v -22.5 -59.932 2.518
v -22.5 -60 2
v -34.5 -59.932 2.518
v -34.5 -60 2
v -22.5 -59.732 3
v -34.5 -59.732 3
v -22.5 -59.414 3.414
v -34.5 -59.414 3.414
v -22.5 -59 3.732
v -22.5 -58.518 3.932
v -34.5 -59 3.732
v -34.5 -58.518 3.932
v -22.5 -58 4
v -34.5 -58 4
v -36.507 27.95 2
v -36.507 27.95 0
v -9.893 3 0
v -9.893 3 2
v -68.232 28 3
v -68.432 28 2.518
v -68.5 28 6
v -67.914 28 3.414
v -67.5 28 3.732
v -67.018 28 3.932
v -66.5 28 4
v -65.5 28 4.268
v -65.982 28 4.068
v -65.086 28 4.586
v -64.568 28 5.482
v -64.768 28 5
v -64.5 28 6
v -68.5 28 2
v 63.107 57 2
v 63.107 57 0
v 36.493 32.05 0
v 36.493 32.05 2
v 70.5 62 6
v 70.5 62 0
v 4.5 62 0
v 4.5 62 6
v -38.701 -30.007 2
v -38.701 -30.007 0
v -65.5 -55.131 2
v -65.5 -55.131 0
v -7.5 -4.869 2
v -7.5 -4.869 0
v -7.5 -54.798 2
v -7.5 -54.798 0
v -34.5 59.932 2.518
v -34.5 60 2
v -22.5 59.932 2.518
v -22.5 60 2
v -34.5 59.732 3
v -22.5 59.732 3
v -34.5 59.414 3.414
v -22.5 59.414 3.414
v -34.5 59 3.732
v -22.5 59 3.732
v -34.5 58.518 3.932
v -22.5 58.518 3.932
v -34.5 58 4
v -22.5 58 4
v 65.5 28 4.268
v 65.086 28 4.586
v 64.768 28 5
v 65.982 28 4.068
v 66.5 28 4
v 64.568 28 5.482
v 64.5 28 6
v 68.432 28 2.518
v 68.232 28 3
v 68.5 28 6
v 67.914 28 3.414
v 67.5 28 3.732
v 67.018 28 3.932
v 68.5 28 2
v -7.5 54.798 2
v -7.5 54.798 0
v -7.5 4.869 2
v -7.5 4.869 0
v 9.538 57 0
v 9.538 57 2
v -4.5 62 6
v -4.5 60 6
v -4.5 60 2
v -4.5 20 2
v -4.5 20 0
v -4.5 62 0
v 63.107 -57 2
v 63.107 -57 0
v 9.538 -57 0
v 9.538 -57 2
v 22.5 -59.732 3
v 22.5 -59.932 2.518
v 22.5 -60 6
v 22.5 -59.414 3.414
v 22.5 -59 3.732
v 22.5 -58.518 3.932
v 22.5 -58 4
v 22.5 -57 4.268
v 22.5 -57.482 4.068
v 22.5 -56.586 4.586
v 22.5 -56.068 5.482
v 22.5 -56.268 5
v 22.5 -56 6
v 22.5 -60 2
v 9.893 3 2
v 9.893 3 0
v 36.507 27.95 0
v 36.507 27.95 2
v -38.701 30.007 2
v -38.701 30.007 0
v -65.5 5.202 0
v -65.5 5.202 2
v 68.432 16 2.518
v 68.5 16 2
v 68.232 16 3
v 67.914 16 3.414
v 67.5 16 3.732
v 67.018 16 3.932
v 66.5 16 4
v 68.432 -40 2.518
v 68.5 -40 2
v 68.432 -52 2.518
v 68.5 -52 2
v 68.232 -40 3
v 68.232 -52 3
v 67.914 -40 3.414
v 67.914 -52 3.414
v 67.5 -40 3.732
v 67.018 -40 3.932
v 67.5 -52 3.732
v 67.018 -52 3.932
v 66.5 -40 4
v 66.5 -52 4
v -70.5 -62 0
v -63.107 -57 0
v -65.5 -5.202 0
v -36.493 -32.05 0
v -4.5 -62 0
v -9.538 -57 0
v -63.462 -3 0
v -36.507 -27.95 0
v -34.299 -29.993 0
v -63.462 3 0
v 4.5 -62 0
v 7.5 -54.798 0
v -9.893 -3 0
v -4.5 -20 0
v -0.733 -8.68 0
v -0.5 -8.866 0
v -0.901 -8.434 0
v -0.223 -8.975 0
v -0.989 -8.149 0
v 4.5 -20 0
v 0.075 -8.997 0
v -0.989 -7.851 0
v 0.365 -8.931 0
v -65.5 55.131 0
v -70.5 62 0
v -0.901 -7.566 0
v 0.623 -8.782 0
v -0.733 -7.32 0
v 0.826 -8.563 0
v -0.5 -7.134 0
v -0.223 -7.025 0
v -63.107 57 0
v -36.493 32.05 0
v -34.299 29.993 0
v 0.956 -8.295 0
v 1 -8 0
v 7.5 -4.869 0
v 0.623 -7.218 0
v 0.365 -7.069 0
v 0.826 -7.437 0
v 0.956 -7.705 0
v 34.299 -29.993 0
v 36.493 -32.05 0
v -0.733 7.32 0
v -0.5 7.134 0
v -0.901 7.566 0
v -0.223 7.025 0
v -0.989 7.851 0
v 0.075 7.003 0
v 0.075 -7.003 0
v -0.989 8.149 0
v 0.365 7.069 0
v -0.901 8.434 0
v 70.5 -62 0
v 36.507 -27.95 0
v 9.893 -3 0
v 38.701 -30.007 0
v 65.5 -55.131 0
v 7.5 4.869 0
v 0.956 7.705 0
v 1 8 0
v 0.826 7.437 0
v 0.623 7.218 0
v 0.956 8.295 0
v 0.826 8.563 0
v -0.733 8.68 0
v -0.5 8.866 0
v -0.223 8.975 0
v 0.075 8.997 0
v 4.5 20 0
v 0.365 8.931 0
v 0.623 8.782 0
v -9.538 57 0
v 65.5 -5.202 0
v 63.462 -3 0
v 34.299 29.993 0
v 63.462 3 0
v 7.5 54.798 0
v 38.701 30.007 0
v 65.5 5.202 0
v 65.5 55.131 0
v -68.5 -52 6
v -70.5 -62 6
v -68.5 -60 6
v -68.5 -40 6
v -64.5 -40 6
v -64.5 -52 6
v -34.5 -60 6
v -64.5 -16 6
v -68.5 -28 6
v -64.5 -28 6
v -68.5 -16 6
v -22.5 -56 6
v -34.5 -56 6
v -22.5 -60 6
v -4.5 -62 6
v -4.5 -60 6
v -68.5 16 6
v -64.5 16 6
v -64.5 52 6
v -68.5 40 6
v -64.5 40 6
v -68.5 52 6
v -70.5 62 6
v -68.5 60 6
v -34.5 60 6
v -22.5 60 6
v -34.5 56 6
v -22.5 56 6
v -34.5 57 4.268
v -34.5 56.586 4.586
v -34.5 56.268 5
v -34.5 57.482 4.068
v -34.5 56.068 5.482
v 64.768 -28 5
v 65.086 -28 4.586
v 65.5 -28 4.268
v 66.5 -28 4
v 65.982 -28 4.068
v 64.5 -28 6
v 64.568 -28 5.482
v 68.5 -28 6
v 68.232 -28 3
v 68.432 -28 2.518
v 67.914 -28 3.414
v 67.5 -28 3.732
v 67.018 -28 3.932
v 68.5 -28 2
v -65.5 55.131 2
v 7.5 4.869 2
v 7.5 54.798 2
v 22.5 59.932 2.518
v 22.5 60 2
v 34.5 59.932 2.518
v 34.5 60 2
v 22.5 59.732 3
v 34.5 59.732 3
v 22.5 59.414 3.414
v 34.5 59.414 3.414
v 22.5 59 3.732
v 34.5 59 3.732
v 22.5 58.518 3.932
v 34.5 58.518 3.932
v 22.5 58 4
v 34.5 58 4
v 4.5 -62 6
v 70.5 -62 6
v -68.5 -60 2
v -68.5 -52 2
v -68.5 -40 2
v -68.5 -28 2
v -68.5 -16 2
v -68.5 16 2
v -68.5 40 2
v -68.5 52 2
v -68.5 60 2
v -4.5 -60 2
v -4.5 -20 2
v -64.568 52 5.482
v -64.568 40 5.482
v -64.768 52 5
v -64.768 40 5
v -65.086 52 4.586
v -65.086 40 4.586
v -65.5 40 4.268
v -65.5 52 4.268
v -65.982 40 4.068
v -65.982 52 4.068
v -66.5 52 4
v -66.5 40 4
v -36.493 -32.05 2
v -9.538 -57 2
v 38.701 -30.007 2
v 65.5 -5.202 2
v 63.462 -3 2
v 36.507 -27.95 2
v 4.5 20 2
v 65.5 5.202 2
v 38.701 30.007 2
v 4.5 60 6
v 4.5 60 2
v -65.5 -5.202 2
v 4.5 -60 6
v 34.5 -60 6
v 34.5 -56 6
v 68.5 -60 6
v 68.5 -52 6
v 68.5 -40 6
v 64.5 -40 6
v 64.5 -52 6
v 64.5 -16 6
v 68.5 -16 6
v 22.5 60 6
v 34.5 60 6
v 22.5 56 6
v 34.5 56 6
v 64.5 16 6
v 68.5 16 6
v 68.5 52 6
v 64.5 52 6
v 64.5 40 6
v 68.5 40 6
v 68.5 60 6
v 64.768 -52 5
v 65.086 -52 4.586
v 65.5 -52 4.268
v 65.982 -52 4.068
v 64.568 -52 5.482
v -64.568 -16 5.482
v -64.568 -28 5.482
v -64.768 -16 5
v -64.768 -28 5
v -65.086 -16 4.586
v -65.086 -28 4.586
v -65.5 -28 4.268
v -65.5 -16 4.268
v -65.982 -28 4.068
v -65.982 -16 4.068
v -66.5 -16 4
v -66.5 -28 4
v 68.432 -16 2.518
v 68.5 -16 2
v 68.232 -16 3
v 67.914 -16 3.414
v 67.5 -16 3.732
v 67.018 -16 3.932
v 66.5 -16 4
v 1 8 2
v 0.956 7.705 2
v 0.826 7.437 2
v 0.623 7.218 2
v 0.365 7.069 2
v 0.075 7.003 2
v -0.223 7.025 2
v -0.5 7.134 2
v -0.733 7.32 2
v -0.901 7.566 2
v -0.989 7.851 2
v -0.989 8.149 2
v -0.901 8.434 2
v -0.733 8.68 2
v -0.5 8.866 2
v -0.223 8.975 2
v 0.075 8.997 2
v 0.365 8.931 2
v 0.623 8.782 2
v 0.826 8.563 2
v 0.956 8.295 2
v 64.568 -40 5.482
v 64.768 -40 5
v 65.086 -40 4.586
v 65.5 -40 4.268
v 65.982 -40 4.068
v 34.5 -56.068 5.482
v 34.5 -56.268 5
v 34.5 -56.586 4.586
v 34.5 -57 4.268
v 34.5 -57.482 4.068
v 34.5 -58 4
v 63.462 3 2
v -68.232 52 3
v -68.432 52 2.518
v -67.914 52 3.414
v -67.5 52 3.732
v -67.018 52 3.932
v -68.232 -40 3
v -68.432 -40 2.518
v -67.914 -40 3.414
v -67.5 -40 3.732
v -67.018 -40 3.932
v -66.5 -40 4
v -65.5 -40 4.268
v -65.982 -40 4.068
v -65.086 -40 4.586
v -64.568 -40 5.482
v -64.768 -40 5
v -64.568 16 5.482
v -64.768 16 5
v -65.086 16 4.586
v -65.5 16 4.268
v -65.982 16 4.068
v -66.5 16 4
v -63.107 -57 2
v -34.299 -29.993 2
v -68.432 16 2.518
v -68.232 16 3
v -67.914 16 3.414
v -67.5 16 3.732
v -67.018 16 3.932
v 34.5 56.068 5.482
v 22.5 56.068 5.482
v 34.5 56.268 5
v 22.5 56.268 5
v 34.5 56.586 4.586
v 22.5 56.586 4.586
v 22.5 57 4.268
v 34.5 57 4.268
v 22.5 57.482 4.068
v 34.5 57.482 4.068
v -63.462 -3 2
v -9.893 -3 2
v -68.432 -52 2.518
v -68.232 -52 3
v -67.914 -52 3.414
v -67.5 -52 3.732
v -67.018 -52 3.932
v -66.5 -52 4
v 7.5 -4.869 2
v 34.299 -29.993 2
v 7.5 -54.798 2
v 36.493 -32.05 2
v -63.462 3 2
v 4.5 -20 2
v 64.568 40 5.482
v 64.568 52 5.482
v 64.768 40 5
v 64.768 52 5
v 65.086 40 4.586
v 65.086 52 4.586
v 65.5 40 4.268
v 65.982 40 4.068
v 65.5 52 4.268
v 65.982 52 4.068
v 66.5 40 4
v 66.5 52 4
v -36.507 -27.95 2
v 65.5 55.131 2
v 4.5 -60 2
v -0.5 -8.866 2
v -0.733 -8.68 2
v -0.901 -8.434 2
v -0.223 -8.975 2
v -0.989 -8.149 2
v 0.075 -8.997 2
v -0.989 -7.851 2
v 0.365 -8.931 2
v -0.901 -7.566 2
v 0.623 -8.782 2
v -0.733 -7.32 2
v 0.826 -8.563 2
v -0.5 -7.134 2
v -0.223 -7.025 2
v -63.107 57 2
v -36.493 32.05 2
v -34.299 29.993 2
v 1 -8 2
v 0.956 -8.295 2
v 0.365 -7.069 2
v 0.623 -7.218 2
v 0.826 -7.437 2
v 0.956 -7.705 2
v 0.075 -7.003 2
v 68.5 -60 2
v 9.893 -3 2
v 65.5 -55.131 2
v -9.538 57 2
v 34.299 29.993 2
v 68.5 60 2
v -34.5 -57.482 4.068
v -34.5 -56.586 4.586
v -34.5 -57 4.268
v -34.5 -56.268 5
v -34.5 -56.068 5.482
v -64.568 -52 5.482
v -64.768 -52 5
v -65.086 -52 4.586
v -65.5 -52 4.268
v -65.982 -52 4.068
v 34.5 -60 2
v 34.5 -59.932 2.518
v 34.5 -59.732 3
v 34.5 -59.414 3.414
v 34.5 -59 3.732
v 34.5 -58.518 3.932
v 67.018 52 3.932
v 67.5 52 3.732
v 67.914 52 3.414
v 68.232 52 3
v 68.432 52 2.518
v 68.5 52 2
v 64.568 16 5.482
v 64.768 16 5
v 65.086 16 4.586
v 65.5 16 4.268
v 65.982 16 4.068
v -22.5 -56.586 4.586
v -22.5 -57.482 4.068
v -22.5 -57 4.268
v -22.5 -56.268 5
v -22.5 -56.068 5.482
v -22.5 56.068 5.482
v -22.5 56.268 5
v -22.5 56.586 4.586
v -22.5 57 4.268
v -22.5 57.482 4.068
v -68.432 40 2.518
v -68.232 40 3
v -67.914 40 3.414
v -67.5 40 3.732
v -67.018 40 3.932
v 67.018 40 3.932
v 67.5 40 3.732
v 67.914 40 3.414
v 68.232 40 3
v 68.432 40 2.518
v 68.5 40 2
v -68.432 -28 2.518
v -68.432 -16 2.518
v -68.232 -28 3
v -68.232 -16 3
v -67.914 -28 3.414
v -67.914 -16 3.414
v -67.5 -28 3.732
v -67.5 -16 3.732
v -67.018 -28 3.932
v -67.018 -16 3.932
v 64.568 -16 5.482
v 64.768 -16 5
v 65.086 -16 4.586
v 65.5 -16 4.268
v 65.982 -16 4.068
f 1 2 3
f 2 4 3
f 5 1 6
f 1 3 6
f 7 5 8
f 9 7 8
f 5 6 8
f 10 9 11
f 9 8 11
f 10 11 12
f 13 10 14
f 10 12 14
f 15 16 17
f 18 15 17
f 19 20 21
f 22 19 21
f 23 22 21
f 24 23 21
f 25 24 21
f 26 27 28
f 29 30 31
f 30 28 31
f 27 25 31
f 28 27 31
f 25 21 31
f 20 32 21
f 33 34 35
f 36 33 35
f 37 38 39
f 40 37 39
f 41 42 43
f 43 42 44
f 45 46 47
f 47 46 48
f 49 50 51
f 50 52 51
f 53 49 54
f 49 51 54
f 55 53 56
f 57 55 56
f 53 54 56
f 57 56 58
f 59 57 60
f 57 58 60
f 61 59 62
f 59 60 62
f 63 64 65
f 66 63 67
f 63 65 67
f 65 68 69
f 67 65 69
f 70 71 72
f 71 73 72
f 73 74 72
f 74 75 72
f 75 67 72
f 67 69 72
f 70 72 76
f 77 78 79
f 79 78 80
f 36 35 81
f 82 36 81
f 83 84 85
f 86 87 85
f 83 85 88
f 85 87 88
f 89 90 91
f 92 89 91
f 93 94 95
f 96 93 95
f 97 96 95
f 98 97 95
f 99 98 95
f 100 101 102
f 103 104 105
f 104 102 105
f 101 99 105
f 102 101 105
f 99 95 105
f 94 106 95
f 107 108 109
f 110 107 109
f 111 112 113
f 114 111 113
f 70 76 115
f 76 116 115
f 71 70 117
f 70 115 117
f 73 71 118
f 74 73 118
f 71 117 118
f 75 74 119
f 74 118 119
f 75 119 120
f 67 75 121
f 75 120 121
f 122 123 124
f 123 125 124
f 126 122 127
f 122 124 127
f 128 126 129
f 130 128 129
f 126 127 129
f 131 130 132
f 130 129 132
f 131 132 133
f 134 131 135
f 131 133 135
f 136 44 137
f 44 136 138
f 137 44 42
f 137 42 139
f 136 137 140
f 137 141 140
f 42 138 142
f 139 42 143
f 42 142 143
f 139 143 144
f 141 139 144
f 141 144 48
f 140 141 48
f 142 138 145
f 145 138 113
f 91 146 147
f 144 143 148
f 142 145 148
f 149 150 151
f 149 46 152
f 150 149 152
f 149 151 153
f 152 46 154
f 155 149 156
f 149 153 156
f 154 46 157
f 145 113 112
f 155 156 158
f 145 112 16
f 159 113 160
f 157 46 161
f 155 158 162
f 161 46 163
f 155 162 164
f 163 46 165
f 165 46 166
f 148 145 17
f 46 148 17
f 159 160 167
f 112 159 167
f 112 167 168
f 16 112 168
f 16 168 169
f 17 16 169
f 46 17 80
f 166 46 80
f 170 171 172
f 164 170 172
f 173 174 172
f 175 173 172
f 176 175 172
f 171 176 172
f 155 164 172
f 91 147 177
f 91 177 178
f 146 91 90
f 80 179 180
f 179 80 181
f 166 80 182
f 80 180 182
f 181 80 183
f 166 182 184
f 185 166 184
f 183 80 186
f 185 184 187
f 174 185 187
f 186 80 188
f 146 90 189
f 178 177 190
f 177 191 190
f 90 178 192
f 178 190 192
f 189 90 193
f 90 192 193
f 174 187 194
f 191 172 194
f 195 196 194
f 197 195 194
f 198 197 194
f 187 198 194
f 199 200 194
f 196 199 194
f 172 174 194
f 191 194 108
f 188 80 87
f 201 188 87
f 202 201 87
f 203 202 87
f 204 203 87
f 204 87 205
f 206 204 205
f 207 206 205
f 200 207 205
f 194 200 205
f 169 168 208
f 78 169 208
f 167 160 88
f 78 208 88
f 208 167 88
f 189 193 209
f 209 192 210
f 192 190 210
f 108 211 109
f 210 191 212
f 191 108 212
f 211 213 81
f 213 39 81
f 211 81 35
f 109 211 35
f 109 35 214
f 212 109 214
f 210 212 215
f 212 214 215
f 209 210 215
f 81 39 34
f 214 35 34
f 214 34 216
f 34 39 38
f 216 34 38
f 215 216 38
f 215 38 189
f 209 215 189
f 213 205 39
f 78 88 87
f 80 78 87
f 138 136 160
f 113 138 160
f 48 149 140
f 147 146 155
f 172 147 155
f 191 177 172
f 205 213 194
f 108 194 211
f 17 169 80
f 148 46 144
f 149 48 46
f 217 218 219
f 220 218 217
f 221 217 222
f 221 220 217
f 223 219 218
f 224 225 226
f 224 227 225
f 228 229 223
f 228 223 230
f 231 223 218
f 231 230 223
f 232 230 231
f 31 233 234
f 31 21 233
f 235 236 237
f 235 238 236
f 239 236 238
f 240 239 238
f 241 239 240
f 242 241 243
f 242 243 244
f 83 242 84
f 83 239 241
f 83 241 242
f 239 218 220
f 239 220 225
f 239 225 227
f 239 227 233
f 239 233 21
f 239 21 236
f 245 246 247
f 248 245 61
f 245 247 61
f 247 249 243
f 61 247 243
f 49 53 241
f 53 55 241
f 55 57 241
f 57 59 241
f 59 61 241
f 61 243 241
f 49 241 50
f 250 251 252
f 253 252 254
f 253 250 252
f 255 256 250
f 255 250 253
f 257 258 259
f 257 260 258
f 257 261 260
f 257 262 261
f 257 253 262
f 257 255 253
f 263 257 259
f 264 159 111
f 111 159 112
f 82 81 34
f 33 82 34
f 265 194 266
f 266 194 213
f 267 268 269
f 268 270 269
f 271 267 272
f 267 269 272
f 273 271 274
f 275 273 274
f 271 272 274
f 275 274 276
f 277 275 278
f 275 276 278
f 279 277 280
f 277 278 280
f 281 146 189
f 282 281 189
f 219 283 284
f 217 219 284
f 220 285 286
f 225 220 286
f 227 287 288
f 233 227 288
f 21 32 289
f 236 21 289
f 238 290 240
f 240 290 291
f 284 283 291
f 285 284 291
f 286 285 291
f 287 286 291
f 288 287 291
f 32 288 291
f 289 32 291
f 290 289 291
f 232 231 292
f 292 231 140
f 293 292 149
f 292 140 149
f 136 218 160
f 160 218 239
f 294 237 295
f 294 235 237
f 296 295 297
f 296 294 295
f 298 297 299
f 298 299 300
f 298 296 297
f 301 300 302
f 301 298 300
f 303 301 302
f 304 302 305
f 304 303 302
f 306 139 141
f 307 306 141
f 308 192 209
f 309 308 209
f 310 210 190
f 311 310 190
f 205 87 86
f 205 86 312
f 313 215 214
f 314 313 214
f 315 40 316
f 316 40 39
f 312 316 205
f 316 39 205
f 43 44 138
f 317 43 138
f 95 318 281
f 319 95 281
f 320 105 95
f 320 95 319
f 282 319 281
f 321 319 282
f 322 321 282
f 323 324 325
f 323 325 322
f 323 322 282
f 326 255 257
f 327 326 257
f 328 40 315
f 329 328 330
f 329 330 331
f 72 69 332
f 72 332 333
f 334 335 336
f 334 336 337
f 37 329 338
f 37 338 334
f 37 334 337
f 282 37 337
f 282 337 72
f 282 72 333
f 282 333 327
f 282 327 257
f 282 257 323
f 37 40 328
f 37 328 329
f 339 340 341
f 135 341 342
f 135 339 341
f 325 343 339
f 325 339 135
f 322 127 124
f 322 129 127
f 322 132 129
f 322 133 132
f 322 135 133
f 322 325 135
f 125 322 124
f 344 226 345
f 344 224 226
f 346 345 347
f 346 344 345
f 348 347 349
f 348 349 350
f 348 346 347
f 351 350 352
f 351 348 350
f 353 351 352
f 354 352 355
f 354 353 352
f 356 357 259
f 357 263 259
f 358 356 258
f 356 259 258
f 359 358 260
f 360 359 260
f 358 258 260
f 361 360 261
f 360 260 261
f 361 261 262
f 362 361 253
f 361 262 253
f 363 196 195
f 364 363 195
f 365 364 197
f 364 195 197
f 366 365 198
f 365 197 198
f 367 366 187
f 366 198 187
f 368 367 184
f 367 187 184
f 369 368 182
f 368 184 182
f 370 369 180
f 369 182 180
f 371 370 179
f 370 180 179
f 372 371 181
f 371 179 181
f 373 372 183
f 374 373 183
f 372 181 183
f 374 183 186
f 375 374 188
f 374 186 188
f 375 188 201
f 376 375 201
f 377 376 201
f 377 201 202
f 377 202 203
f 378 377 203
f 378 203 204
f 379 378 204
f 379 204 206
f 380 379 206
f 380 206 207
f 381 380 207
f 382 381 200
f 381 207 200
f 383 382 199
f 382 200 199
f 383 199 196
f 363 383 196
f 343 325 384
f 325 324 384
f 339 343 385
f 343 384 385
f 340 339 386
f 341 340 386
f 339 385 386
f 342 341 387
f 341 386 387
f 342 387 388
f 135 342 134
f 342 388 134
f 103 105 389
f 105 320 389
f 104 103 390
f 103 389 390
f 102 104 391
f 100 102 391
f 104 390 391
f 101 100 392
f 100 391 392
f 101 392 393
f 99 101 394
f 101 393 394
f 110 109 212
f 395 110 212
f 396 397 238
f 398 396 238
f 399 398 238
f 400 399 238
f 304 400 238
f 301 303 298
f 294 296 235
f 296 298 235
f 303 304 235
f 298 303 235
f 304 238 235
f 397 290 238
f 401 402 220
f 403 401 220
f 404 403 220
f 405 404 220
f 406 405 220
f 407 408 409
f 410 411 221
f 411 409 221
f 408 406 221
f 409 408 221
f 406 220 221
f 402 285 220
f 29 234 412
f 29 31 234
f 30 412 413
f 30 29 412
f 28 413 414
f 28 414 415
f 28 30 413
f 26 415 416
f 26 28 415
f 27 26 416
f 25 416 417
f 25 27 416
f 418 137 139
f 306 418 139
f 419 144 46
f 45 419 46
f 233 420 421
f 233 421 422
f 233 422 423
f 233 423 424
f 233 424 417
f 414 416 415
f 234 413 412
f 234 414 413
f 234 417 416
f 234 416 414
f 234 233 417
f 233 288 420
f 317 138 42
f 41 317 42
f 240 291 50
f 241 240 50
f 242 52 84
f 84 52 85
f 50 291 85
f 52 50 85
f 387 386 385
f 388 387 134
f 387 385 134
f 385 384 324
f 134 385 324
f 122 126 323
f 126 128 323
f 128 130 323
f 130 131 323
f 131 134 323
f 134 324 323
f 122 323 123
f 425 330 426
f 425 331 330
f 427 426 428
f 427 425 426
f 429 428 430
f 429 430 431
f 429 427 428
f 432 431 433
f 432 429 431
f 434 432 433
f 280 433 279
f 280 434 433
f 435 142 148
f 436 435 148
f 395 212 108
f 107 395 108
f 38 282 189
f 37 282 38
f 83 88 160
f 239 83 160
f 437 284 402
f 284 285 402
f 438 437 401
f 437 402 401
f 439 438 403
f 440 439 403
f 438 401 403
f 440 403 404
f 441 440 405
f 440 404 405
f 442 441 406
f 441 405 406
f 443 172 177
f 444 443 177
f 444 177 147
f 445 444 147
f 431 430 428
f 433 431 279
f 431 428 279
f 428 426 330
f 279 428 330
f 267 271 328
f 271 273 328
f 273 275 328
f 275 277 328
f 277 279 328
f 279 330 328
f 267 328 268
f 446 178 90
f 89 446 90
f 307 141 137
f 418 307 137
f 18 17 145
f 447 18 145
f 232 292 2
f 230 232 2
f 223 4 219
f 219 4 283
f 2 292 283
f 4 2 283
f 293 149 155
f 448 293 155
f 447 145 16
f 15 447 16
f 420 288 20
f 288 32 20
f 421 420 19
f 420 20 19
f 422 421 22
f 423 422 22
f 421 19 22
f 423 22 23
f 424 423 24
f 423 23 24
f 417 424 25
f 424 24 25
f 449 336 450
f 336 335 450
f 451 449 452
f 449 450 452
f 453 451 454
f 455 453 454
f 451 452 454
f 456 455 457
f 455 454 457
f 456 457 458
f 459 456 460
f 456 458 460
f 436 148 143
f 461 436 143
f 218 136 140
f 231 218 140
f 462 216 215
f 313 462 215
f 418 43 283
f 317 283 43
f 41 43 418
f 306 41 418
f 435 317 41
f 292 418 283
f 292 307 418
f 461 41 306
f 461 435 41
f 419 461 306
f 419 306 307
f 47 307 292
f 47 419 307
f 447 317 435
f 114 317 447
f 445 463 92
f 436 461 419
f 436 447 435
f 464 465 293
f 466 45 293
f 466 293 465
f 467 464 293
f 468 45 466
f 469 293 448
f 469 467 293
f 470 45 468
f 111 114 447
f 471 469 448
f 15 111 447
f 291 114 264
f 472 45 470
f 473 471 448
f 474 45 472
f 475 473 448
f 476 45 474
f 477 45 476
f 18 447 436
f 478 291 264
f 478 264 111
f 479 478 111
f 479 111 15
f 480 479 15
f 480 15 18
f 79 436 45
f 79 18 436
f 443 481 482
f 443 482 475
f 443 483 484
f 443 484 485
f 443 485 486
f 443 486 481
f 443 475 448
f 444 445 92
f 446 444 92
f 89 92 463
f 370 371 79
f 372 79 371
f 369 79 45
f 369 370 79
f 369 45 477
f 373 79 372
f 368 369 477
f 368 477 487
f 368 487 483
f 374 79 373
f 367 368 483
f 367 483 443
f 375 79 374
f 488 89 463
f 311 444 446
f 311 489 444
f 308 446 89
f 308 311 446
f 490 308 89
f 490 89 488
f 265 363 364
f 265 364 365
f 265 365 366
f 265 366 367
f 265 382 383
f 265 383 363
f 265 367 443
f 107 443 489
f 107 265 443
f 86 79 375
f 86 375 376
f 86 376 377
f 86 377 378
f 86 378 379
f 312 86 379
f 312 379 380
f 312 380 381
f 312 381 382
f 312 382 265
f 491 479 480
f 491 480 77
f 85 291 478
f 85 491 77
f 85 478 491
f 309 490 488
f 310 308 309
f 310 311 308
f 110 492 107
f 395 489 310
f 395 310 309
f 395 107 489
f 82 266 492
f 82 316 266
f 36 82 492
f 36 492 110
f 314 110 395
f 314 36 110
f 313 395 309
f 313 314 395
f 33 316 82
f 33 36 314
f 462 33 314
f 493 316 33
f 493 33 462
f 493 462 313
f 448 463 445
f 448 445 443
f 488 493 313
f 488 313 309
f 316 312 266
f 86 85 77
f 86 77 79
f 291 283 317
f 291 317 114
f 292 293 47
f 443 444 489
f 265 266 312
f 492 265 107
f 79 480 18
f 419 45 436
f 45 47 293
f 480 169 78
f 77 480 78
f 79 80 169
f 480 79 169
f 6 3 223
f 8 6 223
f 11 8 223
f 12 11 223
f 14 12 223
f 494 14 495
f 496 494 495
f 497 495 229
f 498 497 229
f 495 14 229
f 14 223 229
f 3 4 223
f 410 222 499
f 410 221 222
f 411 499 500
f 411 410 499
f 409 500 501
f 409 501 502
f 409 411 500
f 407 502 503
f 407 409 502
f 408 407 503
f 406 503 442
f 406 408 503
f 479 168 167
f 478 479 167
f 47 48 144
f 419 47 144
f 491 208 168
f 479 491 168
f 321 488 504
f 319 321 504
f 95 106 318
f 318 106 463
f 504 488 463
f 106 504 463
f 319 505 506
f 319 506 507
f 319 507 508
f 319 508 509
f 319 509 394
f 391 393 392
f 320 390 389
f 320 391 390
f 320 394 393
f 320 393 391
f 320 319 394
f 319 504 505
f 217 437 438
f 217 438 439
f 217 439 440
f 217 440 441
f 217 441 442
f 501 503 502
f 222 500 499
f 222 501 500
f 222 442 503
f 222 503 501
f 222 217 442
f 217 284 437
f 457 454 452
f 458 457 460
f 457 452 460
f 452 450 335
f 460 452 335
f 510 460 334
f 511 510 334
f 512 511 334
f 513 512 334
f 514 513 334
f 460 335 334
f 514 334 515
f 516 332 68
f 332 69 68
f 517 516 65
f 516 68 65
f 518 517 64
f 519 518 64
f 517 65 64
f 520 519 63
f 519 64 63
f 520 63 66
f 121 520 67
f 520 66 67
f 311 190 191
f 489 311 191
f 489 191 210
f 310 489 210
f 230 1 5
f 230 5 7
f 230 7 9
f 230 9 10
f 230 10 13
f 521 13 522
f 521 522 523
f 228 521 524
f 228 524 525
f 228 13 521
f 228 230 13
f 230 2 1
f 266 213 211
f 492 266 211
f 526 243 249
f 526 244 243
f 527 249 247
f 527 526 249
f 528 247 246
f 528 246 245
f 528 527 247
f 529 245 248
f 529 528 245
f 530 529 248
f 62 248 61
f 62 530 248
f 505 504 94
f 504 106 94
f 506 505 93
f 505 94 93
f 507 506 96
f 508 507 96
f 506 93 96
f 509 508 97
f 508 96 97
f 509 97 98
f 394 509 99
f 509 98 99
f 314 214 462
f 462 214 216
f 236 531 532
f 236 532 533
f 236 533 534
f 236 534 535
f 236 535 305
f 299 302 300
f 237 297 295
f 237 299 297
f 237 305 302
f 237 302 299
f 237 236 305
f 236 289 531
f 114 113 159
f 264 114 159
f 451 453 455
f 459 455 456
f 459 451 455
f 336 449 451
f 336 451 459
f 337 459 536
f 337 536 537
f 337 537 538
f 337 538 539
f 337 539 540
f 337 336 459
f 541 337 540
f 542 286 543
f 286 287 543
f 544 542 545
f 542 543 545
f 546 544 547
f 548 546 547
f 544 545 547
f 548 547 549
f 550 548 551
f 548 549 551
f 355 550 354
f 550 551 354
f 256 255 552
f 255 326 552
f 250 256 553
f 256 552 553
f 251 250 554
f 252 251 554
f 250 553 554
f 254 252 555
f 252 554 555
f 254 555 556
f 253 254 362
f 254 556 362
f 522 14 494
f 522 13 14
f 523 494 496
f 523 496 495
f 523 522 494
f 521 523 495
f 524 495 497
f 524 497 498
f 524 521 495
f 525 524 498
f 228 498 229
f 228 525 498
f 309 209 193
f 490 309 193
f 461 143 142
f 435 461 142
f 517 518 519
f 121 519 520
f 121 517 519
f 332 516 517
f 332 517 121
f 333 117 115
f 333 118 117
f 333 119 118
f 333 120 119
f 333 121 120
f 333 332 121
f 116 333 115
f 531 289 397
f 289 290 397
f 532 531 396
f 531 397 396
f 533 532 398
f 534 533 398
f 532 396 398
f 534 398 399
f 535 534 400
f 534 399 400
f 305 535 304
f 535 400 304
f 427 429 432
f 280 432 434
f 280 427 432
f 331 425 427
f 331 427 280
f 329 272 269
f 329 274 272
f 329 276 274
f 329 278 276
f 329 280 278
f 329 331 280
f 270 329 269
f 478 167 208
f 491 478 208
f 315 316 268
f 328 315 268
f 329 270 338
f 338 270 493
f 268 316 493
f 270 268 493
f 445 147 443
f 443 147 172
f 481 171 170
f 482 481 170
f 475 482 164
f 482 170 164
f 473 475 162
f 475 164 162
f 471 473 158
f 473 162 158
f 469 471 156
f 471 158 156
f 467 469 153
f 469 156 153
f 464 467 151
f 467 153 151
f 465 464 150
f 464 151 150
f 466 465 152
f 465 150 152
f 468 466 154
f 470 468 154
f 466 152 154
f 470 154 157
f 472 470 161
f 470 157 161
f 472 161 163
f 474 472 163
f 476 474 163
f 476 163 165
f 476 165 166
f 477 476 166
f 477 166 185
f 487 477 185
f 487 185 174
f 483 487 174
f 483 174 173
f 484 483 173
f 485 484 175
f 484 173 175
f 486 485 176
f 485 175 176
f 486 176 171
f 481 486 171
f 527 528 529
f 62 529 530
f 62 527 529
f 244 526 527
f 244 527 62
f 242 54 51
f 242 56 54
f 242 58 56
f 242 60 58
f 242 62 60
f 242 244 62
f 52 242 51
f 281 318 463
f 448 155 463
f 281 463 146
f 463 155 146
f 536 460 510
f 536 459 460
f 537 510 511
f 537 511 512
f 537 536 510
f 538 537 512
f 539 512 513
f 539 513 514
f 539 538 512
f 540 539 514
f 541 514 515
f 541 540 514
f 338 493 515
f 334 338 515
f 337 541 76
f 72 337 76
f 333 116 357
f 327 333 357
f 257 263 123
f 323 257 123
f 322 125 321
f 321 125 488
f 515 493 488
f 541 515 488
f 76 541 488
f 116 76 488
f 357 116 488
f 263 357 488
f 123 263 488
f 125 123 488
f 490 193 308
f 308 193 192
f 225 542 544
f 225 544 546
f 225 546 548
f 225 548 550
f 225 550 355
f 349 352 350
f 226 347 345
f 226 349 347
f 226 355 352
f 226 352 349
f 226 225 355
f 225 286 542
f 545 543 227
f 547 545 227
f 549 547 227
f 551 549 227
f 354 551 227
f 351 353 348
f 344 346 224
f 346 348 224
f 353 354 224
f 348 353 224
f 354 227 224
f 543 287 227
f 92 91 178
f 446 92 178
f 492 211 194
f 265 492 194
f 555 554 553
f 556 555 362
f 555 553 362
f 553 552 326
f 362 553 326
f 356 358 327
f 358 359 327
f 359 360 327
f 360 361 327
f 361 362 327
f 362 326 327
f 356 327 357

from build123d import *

# Parameters (mm, degrees)
F0_W     = 64
F0_H     = 120
F2_DEPTH = 2
F3_DEPTH = 6
F4_W     = 6
F4_H     = 12
F4_W_2   = 12
F4_H_2   = 6
F5_DEPTH = 2
F7_DEPTH = 2
F8_W     = 9
F8_H     = 40
F8_R     = 1
F9_DEPTH = 2
F10_R    = 1.99999
F11_R    = 1.99999


# Not quite as in the source:
# - a fillet or chamfer is up to 0.001 mm smaller than in the source, because OpenCascade refuses the exact size


with BuildPart() as f2:
    # F0 (on Top) → F2 (new body)
    with BuildSketch(Plane.XY):
        with Locations((-36.5, 0)):
            Rectangle(F0_W, F0_H)
    extrude(amount=F2_DEPTH)

    # F1 (on Top) → F3 (join)
    with BuildSketch(Plane.XY):
        Polygon((-4.5, 60), (-4.5, 62), (-70.5, 62), (-70.5, -62), (-4.5, -62), (-4.5, -60), (-68.5, -60), (-68.5, 60), align=None)
    extrude(amount=F3_DEPTH)

    # F4 (on face) → F5 (join)
    with BuildSketch(Plane.XY.offset(6)):
        with Locations((-67.5, 46)):
            Rectangle(F4_W, F4_H)
        with Locations((-28.5, 59)):
            Rectangle(F4_W_2, F4_H_2)
        with Locations((-67.5, 22)):
            Rectangle(F4_W, F4_H)
        with Locations((-28.5, -59)):
            Rectangle(F4_W_2, F4_H_2)
        with Locations((-67.5, -22)):
            Rectangle(F4_W, F4_H)
        with Locations((-67.5, -46)):
            Rectangle(F4_W, F4_H)
    extrude(amount=-F5_DEPTH)


with BuildPart() as f2b:
    # F0 (on Top) → F2, piece 2 (new body)
    with BuildSketch(Plane.XY):
        with Locations((36.5, 0)):
            Rectangle(F0_W, F0_H)
    extrude(amount=F2_DEPTH)

    # F1 (on Top) → F3, piece 2 (join)
    with BuildSketch(Plane.XY):
        Polygon((70.5, -62), (70.5, 62), (4.5, 62), (4.5, 60), (68.5, 60), (68.5, -60), (4.5, -60), (4.5, -62), align=None)
    extrude(amount=F3_DEPTH)

    # F4 (on face) → F5, piece 2 (join)
    with BuildSketch(Plane.XY.offset(6)):
        with Locations((67.5, 46)):
            Rectangle(F4_W, F4_H)
        with Locations((67.5, -22)):
            Rectangle(F4_W, F4_H)
        with Locations((67.5, -46)):
            Rectangle(F4_W, F4_H)
        with Locations((28.5, 59)):
            Rectangle(F4_W_2, F4_H_2)
        with Locations((67.5, 22)):
            Rectangle(F4_W, F4_H)
        with Locations((28.5, -59)):
            Rectangle(F4_W_2, F4_H_2)
    extrude(amount=-F5_DEPTH)


with BuildPart() as f7_tool:
    # F6 (on face) → F7 (new body)
    with BuildSketch(Plane(origin=(0, 0, 0), x_dir=(1, 0, 0), z_dir=(0, 0, -1))):
        Polygon((-9.5378331968, 57.0000003456), (-63.1068291486, 57.0000003456), (-36.4934644097, 32.0499709028), align=None)
        Polygon((-7.5, 4.8685980187), (-7.5, 54.7983564456), (-34.2993455202, 29.9929844439), align=None)
        Polygon((-9.8931712199, 3), (-36.5065294908, 27.9500233789), (-63.4621541524, 3), align=None)
        Polygon((-65.4999873492, 5.2016438999), (-38.7006483802, 30.0070098378), (-65.5, 55.1314019813), align=None)
        Polygon((-63.4621541524, -3), (-36.5065294908, -27.9500233789), (-9.8931712199, -3), align=None)
        Polygon((-7.5, -4.8685980187), (-34.2993455202, -29.9929844439), (-7.5, -54.7983564456), align=None)
        Polygon((-9.5378331968, -57.0000003456), (-36.4934644097, -32.0499709028), (-63.1068291486, -57.0000003456), align=None)
        Polygon((-65.5, -55.1314019813), (-38.7006483802, -30.0070098378), (-65.4999873492, -5.2016438999), align=None)
        Polygon((7.5, -54.7983564456), (34.2993455202, -29.9929844439), (7.5, -4.8685980187), align=None)
        Polygon((63.1068291486, -57.0000003456), (36.4934644097, -32.0499709028), (9.5378331968, -57.0000003456), align=None)
        Polygon((65.5, -55.1314019813), (65.4999873492, -5.2016438999), (38.7006483802, -30.0070098378), align=None)
        Polygon((36.5065294908, -27.9500233789), (63.4621541524, -3), (9.8931712199, -3), align=None)
        Polygon((63.4621541524, 3), (36.5065294908, 27.9500233789), (9.8931712199, 3), align=None)
        Polygon((7.5, 4.8685980187), (34.2993455202, 29.9929844439), (7.5, 54.7983564456), align=None)
        Polygon((9.5378331968, 57.0000003456), (36.4934644097, 32.0499709028), (63.1068291486, 57.0000003456), align=None)
        Polygon((65.5, 55.1314019813), (38.7006483802, 30.0070098378), (65.4999873492, 5.2016438999), align=None)
    extrude(amount=-F7_DEPTH)


with BuildPart() as f2_1:
    add(f2.part)

    # F7: cut by f7_tool
    add(f7_tool.part, mode=Mode.SUBTRACT)



with BuildPart() as f2b_1:
    add(f2b.part)

    # F7: cut by f7_tool
    add(f7_tool.part, mode=Mode.SUBTRACT)


with BuildPart() as f2_2:
    add(f2_1.part)

    add(f2b_1.part)  # F9 merges F2b
    # F8 (on face) → F9 (join)
    with BuildSketch(Plane(origin=(0, 0, 0), x_dir=(1, 0, 0), z_dir=(0, 0, -1))):
        Rectangle(F8_W, F8_H)
        with Locations((0, -8)):
            Circle(F8_R, mode=Mode.SUBTRACT)
        with Locations((0, 8)):
            Circle(F8_R, mode=Mode.SUBTRACT)
    extrude(amount=-F9_DEPTH)

    # F10 (radius 2 in the source; OpenCascade refuses exactly that, so slightly less here)
    f10_edges = [f2_2.edges().sort_by_distance(p)[0] for p in [
        (28.5, -56, 4),
        (-28.5, -56, 4),
        (64.5, -46, 4),
        (64.5, -22, 4),
        (-64.5, -46, 4),
        (-64.5, -22, 4),
        (64.5, 22, 4),
        (64.5, 46, 4),
        (-28.5, 56, 4),
        (28.5, 56, 4),
        (-64.5, 22, 4),
        (-64.5, 46, 4),
    ]]
    fillet(f10_edges, radius=F10_R)

    # F11 (radius 2 in the source; OpenCascade refuses exactly that, so slightly less here)
    f11_edges = [f2_2.edges().sort_by_distance(p)[0] for p in [
        (28.5, -60, 4),
        (-28.5, -60, 4),
        (-68.5, -46, 4),
        (-68.5, -22, 4),
        (68.5, -46, 4),
        (68.5, -22, 4),
        (68.5, 46, 4),
        (68.5, 22, 4),
        (28.5, 60, 4),
        (-28.5, 60, 4),
        (-68.5, 22, 4),
        (-68.5, 46, 4),
    ]]
    fillet(f11_edges, radius=F11_R)


solid = f2_2.part
